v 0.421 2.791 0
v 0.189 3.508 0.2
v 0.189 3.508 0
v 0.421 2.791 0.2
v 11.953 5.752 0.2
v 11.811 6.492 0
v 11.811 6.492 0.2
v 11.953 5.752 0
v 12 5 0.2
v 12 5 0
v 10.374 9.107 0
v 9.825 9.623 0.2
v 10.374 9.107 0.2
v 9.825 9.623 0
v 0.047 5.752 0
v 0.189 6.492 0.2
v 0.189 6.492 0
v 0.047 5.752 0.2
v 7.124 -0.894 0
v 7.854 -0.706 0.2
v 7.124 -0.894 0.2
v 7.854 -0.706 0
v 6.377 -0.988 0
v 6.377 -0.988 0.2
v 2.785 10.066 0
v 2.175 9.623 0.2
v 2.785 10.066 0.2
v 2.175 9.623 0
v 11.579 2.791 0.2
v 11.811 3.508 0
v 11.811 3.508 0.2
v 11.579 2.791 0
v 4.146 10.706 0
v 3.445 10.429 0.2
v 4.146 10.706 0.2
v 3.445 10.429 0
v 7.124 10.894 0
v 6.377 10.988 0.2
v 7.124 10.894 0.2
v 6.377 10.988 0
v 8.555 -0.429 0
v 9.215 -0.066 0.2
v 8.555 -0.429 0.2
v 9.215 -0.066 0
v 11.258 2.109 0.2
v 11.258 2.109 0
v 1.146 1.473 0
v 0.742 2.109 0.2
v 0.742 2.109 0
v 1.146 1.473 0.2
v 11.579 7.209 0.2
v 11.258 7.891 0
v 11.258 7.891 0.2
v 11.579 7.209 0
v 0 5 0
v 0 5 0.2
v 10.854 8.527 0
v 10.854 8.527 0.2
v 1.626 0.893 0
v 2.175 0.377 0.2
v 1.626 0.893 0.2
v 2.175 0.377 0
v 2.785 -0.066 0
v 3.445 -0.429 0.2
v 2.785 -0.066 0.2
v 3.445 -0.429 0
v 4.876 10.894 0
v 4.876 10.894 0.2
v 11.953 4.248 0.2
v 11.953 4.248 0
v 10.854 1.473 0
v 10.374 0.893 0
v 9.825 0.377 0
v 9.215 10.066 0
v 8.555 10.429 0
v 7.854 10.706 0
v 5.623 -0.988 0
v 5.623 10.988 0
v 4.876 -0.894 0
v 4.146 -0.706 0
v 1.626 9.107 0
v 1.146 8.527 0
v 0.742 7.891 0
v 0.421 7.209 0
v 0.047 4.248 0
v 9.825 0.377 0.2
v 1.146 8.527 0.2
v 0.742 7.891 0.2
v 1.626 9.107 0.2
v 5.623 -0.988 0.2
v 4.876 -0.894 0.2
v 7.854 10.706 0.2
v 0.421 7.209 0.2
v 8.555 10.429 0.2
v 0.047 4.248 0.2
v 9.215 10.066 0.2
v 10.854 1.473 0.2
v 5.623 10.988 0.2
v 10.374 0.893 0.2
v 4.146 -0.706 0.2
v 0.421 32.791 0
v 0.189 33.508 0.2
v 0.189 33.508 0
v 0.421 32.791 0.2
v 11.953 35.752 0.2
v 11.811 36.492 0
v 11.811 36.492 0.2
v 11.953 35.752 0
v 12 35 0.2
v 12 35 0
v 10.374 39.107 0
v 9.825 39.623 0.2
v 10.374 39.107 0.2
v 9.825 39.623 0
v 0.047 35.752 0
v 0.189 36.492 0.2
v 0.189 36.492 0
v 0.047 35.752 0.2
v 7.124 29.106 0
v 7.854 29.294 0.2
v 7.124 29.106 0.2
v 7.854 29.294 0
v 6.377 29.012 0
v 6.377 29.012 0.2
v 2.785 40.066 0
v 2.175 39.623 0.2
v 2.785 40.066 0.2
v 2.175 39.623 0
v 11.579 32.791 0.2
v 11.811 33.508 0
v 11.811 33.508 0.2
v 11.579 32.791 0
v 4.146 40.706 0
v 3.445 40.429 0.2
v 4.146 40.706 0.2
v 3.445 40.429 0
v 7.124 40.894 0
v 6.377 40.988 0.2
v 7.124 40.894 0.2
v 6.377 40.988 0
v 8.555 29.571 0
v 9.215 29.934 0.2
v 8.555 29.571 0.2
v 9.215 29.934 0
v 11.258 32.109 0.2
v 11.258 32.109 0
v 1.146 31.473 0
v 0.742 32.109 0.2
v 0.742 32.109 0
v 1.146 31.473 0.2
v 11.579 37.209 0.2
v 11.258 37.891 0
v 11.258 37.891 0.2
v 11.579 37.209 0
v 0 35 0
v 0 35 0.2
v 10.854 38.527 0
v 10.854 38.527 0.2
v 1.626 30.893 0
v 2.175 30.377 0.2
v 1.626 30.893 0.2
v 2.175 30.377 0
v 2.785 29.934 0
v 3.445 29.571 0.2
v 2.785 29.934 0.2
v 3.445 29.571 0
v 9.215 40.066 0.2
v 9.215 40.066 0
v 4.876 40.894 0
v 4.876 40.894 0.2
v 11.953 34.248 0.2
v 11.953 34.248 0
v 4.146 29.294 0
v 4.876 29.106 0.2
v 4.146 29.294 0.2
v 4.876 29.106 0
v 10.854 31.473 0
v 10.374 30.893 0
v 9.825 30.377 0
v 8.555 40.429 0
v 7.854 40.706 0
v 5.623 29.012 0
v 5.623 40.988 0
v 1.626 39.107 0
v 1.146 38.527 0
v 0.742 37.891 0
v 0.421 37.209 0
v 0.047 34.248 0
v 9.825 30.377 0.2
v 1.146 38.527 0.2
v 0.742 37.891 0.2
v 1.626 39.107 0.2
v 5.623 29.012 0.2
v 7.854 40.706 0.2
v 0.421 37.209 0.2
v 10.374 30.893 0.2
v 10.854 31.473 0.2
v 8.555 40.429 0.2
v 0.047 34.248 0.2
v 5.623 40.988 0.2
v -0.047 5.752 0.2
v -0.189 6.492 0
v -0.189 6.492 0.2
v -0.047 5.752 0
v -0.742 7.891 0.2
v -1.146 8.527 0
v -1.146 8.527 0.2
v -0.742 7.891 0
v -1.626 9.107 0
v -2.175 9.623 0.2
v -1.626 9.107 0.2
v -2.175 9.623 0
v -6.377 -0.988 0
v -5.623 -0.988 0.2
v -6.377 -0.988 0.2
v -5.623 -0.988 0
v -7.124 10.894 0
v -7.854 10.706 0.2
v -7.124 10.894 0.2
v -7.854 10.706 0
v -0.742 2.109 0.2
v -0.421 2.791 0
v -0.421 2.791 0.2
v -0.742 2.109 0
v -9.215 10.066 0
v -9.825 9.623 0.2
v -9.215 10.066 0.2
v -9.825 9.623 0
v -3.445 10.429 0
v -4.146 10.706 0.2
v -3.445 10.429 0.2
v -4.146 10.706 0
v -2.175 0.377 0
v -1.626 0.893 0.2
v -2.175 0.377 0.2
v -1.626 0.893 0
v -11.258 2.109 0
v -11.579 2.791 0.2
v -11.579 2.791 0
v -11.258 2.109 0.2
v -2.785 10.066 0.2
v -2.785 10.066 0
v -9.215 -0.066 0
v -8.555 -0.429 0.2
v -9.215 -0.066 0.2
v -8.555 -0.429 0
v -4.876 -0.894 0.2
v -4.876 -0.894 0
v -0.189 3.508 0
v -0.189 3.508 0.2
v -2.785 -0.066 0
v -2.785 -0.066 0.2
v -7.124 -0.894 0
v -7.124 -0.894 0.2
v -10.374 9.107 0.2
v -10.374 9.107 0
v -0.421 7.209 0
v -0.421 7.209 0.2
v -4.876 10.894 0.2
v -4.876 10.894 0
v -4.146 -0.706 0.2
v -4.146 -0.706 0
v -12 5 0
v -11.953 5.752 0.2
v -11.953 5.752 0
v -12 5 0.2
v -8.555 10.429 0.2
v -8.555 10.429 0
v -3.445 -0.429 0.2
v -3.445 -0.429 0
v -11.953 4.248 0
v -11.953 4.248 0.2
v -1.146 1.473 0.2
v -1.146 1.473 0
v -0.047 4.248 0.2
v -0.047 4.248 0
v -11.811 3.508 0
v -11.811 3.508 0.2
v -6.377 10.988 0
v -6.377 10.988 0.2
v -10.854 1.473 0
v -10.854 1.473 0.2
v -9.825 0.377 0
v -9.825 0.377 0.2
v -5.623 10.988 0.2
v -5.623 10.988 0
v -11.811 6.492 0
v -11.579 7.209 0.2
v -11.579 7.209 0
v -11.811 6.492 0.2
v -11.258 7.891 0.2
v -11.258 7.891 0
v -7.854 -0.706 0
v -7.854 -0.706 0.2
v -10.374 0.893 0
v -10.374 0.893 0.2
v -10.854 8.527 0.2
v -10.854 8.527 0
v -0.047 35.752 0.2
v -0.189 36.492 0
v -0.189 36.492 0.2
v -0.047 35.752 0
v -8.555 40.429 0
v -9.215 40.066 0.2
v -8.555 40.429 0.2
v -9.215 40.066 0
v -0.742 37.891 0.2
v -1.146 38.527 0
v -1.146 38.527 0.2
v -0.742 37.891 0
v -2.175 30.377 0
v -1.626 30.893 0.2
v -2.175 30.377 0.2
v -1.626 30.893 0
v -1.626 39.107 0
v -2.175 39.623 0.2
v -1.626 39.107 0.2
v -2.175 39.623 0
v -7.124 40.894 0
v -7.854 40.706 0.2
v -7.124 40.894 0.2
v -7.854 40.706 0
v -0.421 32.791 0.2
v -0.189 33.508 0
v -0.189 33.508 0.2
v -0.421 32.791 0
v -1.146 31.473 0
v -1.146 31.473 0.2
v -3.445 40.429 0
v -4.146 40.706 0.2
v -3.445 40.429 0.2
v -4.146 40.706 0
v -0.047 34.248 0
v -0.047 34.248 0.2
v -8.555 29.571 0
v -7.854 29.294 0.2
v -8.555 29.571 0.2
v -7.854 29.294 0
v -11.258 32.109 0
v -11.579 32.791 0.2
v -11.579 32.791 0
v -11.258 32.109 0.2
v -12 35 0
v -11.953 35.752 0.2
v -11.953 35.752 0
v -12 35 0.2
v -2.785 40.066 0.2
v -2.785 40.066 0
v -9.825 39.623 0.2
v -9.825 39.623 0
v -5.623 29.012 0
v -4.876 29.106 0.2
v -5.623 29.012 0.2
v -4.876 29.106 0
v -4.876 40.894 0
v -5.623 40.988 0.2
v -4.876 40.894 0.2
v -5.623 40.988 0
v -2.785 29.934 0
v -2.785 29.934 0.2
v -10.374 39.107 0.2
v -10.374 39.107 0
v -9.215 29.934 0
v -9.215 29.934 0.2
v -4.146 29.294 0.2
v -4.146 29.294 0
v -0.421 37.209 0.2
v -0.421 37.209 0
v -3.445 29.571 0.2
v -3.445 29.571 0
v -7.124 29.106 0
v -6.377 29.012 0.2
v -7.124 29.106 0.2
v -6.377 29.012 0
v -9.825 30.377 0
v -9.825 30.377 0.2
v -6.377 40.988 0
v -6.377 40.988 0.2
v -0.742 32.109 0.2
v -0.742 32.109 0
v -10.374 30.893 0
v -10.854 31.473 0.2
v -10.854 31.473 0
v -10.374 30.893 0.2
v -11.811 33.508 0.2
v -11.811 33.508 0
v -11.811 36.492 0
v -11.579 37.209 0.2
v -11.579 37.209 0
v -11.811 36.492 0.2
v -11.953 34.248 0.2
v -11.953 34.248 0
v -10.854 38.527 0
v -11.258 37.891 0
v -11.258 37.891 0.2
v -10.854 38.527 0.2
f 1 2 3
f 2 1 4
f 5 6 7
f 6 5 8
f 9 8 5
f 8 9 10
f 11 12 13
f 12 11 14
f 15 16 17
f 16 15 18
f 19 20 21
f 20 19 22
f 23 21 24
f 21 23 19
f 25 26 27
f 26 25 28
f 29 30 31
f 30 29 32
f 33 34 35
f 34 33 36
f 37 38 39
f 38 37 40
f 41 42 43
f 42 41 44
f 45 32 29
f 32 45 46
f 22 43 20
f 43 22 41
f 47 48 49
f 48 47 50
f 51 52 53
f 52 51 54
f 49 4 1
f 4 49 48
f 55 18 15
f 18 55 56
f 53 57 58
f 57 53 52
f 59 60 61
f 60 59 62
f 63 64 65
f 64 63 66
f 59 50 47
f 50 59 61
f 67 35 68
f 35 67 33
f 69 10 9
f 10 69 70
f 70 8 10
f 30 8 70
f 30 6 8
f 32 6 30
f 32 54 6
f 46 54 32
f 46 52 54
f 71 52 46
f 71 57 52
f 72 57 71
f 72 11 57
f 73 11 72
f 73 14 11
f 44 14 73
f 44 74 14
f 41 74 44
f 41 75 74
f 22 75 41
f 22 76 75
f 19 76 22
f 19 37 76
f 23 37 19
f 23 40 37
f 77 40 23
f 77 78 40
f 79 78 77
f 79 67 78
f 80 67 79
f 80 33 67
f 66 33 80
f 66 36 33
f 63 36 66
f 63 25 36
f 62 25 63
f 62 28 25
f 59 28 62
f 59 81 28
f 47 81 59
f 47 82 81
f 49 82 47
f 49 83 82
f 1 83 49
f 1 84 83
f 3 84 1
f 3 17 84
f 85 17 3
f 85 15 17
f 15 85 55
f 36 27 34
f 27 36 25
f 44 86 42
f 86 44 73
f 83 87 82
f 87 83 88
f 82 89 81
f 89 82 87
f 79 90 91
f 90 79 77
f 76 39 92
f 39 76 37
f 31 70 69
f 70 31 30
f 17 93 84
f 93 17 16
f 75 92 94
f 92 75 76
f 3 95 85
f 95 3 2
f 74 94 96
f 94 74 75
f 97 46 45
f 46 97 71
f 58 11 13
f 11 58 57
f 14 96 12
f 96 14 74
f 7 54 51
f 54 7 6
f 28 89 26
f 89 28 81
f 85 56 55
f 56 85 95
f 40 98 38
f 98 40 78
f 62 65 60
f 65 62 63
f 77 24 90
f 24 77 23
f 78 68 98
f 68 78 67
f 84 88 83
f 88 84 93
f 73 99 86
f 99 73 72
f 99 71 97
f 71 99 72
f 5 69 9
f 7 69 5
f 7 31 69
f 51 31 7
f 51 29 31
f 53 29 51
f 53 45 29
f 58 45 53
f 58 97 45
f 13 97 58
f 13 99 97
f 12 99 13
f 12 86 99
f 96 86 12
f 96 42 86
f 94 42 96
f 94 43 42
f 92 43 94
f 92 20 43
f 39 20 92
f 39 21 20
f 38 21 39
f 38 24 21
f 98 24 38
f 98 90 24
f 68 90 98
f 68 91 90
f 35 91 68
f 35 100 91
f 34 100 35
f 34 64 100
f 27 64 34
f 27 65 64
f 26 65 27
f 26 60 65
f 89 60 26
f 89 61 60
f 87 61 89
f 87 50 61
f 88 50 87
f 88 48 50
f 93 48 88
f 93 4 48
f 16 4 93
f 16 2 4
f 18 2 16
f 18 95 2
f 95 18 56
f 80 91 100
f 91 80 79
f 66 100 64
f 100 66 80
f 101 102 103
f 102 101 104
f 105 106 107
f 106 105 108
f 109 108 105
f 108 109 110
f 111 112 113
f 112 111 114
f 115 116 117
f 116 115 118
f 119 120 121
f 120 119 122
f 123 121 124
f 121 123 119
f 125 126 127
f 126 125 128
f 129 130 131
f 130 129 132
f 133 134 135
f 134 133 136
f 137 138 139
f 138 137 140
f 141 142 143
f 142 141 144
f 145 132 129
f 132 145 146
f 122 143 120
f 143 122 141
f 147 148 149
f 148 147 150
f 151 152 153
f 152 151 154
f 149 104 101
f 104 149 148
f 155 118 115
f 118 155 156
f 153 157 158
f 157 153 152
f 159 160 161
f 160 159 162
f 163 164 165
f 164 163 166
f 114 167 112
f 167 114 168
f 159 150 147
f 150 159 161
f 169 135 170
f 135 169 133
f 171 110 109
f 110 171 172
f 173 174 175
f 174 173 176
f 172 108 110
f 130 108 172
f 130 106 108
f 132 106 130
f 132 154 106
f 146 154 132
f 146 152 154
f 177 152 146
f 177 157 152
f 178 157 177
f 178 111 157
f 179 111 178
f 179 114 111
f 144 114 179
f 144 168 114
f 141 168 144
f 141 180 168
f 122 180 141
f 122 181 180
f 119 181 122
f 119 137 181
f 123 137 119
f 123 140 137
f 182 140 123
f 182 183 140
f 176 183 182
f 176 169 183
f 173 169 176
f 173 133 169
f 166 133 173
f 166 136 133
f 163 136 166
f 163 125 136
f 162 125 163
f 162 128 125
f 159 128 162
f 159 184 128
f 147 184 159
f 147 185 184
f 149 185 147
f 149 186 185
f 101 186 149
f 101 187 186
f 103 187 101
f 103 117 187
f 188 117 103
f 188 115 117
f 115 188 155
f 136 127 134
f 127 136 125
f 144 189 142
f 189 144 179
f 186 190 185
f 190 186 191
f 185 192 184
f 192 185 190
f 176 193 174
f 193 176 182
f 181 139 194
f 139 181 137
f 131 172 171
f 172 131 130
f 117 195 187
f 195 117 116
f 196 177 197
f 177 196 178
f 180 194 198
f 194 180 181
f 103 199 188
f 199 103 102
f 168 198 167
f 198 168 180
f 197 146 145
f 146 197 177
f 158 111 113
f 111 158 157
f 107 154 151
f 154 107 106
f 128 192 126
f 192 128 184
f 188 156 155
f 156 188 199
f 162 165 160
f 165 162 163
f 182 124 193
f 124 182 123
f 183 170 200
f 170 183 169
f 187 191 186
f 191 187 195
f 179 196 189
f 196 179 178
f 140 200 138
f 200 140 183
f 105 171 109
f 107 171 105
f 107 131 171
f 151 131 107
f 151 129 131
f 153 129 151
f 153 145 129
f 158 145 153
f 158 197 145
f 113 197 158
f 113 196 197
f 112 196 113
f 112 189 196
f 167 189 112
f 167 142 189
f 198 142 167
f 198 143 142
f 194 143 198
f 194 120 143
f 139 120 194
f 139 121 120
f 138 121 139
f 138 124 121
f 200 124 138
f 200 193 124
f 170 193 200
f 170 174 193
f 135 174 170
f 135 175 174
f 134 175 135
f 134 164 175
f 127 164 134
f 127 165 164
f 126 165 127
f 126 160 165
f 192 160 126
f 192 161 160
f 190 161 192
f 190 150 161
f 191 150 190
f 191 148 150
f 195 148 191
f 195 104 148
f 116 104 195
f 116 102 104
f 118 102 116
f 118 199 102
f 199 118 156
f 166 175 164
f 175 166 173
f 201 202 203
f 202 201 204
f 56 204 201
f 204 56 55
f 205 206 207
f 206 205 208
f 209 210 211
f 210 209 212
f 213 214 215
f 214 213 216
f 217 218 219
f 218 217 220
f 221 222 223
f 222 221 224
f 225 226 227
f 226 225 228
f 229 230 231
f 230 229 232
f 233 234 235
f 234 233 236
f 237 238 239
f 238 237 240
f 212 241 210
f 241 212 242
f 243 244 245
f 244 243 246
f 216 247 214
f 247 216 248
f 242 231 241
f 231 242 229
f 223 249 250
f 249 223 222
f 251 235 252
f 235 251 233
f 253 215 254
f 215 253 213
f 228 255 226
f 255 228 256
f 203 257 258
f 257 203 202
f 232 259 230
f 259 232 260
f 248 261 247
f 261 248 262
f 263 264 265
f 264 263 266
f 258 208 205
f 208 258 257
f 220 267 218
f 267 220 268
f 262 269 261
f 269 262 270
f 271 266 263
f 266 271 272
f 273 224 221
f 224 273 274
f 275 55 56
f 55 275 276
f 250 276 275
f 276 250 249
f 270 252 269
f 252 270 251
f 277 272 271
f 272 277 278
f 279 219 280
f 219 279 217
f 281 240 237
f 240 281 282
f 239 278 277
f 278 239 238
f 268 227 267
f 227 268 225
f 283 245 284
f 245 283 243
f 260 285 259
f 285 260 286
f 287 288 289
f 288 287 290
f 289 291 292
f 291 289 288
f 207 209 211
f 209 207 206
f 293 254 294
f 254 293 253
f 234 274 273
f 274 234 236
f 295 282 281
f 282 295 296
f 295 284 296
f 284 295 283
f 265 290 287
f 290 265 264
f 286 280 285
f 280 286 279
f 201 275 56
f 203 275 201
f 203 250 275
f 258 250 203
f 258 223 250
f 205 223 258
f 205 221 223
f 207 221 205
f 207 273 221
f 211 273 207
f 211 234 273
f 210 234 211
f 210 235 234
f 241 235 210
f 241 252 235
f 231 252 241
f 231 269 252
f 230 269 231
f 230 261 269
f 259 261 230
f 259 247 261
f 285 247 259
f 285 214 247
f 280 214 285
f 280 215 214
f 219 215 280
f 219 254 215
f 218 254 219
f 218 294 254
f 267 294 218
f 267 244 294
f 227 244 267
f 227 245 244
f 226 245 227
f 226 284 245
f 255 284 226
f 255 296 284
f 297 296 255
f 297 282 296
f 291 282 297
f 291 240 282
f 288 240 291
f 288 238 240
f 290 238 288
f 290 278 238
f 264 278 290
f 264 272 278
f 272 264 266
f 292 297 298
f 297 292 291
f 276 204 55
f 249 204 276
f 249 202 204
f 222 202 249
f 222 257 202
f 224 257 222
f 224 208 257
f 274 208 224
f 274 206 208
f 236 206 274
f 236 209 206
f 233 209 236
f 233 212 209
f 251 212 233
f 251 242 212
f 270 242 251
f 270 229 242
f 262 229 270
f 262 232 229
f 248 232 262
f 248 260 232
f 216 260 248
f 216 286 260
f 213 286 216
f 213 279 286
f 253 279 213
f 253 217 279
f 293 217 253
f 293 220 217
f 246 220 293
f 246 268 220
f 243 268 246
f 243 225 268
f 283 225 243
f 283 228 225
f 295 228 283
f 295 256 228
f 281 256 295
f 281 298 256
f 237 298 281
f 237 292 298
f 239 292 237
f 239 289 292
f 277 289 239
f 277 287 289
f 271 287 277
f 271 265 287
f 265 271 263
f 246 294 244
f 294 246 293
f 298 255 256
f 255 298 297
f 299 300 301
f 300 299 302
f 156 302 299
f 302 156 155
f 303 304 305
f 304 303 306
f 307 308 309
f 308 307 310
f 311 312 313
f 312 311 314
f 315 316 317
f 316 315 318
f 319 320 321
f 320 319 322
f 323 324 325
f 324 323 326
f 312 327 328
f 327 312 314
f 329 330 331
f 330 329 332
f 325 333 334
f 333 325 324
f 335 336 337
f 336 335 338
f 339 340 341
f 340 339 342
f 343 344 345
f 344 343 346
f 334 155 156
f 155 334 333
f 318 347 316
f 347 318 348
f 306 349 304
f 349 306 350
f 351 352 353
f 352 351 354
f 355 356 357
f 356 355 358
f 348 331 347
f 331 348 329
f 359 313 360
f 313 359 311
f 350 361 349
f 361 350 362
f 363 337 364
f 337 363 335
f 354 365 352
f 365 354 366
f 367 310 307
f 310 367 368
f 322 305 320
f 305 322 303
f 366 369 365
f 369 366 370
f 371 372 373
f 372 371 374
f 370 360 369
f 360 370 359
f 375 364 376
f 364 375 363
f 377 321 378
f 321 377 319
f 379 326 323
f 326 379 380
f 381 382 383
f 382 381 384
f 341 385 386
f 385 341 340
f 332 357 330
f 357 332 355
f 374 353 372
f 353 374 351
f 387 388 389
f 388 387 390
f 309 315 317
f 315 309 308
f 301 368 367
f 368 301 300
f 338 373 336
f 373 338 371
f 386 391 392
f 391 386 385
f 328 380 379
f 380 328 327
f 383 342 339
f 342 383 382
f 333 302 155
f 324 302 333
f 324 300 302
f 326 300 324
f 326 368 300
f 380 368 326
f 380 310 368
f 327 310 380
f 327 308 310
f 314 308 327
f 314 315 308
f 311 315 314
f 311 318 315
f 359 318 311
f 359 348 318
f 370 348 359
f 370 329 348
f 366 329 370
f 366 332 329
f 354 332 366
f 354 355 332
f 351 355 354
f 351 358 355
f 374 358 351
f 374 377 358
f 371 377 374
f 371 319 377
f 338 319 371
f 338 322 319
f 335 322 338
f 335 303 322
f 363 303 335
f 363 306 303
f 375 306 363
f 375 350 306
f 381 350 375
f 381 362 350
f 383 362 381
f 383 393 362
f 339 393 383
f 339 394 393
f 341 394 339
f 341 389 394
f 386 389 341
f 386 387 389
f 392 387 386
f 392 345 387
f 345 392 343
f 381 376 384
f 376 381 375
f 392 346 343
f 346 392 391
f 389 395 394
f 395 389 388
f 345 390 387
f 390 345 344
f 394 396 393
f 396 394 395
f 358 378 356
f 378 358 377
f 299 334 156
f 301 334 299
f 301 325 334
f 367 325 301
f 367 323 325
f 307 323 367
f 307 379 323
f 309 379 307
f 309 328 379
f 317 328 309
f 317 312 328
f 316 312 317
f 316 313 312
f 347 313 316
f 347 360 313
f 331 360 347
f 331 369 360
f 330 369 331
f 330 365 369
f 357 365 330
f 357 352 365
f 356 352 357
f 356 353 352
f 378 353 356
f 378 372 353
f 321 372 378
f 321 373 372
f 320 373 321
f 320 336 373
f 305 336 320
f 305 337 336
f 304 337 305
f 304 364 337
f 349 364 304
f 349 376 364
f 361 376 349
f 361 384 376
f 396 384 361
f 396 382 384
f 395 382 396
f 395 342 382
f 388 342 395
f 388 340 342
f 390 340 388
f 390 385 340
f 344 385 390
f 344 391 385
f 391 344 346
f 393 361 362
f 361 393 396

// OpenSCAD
union() {
  union() {
    union() {
      translate([6, 5, 0]) {
        cylinder(h = 0.2, r = 6);
      }
      translate([6, 35, 0]) {
        cylinder(h = 0.2, r = 6);
      }
    }
    translate([-6, 5, 0]) {
      cylinder(h = 0.2, r = 6);
    }
  }
  translate([-6, 35, 0]) {
    cylinder(h = 0.2, r = 6);
  }
}
$fn = 50;
